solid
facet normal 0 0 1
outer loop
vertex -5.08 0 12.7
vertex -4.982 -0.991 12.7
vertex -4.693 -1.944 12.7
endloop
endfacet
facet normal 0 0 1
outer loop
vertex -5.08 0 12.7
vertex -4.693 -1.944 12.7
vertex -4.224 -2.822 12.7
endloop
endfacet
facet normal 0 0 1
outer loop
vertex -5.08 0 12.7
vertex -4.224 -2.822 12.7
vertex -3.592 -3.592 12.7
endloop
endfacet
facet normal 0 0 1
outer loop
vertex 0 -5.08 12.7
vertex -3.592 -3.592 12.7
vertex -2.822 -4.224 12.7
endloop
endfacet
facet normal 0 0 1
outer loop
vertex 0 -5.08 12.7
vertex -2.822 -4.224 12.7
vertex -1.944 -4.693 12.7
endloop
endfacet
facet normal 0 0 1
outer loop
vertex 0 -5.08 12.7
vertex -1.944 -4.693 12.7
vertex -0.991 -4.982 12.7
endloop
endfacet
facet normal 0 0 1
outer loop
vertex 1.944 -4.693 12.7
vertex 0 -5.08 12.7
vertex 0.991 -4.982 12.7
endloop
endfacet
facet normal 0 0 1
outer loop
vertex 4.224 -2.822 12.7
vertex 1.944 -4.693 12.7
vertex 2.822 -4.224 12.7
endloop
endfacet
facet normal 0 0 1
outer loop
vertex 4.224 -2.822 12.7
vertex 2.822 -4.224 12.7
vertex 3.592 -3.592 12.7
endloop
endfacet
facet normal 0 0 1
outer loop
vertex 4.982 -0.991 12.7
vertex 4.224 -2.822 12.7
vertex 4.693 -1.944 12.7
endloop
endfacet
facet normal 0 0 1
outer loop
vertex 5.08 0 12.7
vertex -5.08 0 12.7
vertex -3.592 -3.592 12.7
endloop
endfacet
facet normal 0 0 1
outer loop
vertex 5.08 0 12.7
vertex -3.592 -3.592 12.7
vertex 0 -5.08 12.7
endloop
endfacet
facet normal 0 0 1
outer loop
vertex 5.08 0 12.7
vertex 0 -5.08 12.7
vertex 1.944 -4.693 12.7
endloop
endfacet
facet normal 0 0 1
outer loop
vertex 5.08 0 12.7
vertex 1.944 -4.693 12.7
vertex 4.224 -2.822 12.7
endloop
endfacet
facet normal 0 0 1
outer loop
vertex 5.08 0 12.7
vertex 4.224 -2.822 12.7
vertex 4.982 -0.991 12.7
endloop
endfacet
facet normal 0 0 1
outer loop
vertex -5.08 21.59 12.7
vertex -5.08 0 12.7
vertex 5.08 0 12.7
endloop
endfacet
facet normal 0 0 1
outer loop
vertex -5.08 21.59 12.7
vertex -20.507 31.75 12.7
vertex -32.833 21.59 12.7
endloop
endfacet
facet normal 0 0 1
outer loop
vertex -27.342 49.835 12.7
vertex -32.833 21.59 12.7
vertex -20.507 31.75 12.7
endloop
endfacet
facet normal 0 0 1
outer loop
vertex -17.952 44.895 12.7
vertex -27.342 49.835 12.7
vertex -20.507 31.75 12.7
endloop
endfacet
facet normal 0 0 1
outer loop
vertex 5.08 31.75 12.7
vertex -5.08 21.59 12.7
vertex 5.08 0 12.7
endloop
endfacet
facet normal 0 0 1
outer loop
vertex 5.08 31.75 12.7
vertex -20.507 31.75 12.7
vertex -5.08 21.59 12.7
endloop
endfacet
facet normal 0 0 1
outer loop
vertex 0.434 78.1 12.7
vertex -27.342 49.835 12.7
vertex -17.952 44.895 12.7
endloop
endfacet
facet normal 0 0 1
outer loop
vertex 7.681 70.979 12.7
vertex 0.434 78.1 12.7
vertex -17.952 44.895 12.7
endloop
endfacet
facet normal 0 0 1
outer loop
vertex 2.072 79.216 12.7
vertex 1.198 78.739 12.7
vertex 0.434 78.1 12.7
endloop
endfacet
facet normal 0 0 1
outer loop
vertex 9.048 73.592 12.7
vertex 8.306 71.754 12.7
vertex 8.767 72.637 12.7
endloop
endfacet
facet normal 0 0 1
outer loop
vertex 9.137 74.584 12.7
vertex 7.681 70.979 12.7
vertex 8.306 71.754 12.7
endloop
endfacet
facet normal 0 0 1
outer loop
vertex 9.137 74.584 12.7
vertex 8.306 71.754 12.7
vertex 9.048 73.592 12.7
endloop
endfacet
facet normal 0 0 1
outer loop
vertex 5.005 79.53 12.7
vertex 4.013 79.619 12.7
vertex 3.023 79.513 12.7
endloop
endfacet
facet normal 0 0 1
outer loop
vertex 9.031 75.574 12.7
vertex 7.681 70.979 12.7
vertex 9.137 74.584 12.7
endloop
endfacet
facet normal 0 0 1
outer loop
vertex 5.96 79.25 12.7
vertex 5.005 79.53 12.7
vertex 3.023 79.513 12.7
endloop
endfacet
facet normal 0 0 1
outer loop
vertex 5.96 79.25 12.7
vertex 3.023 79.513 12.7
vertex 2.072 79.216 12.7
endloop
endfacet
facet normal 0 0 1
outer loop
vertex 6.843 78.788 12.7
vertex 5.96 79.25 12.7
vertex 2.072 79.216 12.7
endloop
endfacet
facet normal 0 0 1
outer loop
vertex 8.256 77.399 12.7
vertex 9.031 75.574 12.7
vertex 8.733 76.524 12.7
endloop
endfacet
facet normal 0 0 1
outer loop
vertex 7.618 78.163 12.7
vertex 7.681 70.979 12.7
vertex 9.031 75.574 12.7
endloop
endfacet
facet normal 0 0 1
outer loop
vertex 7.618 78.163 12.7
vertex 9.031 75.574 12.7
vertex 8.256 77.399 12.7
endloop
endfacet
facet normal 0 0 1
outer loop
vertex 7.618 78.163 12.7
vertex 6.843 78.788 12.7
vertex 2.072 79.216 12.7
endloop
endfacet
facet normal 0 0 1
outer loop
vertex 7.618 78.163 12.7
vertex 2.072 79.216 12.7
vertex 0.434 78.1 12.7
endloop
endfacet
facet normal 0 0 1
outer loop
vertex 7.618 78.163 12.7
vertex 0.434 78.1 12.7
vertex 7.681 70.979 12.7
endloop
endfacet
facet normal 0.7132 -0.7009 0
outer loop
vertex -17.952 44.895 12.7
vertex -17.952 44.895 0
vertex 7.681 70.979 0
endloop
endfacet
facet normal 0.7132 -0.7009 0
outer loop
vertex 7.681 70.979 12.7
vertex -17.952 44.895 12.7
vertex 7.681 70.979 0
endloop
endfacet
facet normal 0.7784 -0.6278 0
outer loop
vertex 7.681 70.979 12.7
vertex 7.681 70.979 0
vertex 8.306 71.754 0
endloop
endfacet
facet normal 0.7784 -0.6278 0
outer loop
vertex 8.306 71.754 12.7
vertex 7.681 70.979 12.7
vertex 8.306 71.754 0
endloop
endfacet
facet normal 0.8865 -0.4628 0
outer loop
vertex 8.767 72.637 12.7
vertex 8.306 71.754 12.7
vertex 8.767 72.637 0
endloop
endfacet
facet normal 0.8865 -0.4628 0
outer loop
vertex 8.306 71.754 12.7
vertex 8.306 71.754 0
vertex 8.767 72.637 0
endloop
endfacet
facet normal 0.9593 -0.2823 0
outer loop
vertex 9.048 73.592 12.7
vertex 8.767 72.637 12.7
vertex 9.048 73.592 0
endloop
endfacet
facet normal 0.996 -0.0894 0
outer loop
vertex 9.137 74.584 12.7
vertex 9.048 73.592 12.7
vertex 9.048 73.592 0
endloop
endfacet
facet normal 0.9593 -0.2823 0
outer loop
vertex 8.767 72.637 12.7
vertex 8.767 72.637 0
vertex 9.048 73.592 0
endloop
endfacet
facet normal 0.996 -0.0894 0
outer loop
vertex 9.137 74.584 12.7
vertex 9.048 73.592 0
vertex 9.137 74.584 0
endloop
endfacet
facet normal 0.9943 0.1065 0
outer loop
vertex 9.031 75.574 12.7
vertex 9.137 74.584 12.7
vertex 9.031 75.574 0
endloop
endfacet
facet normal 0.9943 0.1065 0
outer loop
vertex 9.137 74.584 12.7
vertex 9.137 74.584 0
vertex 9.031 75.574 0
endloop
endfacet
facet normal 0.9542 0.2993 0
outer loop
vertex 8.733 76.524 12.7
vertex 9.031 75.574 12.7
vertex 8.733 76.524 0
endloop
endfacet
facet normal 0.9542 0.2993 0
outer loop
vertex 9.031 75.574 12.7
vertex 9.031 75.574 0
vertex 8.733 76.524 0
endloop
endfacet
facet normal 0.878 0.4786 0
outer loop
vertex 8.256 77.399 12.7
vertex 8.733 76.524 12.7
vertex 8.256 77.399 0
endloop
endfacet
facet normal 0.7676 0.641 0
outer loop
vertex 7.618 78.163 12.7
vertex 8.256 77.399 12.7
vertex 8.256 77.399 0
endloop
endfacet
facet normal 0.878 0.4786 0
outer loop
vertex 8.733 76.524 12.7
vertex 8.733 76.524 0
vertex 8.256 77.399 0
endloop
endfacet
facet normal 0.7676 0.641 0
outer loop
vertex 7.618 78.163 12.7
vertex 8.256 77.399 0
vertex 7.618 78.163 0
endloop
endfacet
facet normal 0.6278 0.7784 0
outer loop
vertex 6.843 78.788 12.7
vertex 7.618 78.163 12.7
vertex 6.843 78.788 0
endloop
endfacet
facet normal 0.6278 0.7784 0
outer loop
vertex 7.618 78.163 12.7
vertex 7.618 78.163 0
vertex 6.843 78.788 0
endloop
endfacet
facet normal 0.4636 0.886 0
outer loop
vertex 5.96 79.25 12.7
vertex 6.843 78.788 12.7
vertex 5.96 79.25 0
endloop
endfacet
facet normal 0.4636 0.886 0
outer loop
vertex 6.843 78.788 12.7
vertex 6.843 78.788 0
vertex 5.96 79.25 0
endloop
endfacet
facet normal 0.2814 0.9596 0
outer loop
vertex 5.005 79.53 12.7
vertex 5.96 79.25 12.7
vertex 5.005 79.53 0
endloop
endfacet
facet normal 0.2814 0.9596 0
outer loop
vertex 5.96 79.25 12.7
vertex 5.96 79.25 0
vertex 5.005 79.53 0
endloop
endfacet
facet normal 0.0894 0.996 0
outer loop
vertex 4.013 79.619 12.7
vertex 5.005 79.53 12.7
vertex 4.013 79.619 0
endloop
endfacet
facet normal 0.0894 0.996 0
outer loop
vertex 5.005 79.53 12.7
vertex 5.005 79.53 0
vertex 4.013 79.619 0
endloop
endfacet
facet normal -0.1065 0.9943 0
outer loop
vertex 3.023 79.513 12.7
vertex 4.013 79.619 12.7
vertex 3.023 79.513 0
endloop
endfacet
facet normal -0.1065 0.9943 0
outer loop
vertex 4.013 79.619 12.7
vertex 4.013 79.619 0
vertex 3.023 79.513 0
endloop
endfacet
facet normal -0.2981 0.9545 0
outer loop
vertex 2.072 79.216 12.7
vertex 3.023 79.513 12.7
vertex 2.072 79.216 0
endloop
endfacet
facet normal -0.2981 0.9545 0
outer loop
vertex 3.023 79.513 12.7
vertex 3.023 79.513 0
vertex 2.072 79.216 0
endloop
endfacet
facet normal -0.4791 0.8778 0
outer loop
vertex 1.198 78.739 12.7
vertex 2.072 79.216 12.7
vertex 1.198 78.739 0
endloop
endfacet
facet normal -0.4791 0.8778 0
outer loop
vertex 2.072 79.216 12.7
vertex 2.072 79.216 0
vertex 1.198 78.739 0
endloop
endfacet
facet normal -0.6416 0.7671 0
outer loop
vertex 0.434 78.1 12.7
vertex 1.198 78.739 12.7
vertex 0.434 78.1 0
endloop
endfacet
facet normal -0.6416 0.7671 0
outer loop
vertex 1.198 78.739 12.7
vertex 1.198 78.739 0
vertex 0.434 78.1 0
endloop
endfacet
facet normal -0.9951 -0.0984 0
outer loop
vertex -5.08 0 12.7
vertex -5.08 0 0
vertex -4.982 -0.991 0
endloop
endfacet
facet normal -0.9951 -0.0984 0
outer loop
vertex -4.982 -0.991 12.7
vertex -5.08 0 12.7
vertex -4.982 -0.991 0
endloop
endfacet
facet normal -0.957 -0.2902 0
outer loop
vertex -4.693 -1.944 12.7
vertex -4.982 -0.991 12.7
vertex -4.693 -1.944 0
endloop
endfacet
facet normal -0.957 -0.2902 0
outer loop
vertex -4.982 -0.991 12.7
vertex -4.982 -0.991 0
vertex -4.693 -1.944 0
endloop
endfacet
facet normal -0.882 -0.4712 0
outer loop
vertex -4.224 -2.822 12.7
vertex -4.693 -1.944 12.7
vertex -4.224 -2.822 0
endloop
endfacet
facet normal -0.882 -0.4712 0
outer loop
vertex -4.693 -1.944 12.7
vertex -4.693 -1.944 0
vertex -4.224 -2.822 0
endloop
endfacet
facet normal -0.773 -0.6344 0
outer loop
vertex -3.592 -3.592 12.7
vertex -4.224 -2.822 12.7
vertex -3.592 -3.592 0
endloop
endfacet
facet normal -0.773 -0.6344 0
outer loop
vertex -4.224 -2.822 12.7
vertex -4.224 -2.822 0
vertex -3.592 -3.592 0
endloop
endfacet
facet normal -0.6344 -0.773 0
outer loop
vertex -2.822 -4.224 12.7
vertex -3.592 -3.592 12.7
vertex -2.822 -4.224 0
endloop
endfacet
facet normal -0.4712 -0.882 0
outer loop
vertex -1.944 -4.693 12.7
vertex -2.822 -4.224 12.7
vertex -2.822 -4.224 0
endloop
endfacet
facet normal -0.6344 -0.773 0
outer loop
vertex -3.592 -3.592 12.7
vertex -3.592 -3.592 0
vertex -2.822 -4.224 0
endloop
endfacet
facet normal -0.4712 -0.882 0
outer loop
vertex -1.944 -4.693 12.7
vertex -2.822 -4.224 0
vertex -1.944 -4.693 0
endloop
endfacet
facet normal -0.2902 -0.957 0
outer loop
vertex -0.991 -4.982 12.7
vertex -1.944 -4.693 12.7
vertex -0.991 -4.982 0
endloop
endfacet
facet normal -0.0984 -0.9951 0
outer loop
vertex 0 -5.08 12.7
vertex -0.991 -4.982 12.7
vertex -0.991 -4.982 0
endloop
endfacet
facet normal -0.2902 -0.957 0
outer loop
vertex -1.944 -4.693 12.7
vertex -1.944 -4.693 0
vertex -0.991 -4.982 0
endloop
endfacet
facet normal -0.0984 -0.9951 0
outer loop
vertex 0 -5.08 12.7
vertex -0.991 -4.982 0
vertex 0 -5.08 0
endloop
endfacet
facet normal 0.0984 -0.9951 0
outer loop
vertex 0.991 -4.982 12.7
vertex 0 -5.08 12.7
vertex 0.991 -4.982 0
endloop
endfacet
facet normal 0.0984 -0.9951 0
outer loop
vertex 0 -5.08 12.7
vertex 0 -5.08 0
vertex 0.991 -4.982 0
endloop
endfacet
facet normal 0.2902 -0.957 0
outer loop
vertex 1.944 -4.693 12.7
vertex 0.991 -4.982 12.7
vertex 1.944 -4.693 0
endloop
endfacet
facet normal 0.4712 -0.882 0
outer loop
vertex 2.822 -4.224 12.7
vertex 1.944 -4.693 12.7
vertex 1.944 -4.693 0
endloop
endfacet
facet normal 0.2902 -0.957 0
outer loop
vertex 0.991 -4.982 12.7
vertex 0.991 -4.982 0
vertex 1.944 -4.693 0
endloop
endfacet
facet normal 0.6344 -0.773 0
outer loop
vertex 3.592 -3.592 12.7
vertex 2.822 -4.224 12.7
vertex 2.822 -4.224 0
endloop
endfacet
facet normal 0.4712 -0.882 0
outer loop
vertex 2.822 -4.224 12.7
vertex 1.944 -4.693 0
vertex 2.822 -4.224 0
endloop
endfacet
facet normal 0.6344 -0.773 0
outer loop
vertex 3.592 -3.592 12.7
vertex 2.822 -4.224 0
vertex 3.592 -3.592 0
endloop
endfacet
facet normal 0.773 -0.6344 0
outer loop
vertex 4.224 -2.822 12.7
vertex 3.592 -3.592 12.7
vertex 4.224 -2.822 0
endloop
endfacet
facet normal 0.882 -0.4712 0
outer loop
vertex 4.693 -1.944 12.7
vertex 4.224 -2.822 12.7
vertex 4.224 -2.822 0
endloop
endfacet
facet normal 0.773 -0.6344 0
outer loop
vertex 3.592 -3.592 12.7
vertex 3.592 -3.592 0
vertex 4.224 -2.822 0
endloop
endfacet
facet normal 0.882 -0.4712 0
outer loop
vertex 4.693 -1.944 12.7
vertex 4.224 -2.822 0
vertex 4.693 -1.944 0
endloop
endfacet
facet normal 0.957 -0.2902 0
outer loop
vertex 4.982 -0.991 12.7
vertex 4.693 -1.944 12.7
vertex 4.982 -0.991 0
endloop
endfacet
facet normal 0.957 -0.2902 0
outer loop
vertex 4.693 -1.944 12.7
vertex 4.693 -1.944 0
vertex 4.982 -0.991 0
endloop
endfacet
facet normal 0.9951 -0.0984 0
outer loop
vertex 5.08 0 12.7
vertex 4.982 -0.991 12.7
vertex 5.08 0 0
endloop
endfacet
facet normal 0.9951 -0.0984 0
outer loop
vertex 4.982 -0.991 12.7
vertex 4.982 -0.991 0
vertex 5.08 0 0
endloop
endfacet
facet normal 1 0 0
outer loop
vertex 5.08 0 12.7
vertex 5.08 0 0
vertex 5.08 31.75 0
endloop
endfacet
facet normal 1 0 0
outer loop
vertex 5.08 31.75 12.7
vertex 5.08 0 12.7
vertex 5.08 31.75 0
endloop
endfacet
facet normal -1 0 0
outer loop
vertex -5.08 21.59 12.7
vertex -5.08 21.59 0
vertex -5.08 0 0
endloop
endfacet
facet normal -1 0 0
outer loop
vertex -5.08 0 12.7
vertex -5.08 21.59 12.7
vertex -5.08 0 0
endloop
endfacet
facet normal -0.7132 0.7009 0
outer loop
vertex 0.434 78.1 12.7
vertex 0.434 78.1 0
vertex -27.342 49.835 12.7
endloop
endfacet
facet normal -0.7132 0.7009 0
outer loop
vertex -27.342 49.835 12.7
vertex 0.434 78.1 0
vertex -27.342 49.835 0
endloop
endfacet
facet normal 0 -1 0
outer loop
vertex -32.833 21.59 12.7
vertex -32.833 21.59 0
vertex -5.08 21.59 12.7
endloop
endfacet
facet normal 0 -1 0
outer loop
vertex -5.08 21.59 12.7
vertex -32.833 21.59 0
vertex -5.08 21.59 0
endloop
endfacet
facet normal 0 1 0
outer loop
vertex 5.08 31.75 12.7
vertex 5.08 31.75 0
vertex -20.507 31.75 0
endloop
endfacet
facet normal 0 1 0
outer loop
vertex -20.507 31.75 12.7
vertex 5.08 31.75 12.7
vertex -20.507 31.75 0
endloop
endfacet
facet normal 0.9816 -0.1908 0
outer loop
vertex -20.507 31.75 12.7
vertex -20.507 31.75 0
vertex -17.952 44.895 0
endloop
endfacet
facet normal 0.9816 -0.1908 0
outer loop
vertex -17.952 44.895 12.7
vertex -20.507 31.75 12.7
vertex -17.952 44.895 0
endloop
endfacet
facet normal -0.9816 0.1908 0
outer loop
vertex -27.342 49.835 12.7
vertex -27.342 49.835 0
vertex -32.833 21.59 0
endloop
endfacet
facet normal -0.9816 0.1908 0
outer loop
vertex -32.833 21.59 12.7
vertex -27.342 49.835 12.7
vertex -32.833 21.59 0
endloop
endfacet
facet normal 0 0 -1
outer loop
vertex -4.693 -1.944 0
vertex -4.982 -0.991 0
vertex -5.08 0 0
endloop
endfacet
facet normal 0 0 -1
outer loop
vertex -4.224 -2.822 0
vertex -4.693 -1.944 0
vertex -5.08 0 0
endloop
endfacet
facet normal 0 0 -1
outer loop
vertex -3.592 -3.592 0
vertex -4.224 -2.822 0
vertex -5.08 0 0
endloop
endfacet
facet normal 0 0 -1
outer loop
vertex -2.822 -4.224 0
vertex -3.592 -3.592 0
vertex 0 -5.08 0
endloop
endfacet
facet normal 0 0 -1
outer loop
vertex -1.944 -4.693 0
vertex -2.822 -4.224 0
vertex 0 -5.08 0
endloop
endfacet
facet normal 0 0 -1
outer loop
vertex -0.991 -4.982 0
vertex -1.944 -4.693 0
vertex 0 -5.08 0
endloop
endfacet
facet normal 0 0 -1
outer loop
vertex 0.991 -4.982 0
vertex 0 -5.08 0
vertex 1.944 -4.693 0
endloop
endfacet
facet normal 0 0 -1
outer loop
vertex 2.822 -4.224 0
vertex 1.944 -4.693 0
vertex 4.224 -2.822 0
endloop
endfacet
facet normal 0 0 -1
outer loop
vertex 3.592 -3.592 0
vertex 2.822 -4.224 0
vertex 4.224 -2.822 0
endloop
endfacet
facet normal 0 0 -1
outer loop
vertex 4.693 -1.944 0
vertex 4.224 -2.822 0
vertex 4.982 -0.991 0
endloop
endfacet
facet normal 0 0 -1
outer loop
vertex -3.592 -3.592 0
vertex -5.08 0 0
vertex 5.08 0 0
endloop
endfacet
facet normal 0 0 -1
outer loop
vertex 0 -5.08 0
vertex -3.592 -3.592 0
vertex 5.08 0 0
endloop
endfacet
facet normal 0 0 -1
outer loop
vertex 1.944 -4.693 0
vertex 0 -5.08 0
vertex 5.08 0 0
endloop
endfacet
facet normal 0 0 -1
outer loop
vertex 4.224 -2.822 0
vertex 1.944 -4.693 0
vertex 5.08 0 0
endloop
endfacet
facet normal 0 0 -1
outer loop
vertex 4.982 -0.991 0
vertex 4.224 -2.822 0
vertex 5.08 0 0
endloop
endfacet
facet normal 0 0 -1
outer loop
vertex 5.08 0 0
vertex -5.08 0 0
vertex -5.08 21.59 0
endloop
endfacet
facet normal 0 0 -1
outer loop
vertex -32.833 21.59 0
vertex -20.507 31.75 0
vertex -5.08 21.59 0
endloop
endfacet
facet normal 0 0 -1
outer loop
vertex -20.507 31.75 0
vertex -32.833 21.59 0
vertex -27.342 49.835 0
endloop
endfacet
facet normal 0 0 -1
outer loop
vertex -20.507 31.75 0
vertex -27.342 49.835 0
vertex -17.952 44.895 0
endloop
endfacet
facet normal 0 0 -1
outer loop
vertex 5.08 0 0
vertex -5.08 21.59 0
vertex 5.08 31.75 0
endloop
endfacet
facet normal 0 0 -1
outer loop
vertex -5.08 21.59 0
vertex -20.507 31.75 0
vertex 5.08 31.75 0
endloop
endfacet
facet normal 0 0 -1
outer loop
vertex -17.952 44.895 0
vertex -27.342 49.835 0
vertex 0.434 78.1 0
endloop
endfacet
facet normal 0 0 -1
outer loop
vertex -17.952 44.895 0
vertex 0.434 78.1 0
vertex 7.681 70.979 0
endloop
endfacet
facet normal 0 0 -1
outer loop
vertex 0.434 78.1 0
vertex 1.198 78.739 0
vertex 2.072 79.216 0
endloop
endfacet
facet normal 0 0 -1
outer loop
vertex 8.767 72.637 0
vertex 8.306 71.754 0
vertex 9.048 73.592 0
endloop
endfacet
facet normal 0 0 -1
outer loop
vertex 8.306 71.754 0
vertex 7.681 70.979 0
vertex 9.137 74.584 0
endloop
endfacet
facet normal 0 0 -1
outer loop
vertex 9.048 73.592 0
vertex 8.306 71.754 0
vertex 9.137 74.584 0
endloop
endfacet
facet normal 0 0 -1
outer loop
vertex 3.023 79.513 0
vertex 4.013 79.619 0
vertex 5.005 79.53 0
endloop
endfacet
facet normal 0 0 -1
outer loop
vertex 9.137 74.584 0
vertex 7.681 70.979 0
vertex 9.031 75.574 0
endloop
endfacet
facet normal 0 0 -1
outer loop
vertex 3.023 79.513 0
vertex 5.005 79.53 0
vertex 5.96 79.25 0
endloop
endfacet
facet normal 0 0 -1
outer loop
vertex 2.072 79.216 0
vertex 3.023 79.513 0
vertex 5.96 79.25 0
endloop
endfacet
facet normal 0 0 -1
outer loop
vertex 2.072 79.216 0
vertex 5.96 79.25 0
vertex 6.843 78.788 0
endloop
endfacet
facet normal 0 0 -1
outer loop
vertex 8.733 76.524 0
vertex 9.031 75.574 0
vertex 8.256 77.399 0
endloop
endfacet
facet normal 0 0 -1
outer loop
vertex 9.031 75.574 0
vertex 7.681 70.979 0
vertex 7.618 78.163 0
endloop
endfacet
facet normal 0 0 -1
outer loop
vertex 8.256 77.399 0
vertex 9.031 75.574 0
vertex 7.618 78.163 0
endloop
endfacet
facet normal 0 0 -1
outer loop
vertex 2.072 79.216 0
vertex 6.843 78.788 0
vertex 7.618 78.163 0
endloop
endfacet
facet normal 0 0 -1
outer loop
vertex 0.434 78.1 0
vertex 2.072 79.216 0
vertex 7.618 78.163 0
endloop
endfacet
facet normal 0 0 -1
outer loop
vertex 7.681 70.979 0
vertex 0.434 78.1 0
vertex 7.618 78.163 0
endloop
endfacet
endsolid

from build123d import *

# Parameters (mm, degrees)
F2_DEPTH = 12.7


with BuildPart() as f2:
    # F0 (on Top) → F2 (new body, through all)
    with BuildSketch(Plane.XY):
        with BuildLine():
            Line((-20.507467, 31.75), (-17.952428, 44.894538))
            Line((-17.952428, 44.894538), (7.68059, 70.978887))
            ThreePointArc((7.68059, 70.978887), (7.617897, 78.162819), (0.433966, 78.100125))
            Line((0.433966, 78.100125), (-27.342302, 49.83479))
            Line((-27.342302, 49.83479), (-32.832533, 21.59))
            Line((-32.832533, 21.59), (-5.08, 21.59))
            Line((-5.08, 21.59), (-5.08, 0))
            ThreePointArc((-5.08, 0), (0, -5.08), (5.08, 0))
            Line((5.08, 0), (5.08, 31.75))
            Line((5.08, 31.75), (-20.507467, 31.75))
        make_face()
    extrude(amount=F2_DEPTH)


solid = f2.part
